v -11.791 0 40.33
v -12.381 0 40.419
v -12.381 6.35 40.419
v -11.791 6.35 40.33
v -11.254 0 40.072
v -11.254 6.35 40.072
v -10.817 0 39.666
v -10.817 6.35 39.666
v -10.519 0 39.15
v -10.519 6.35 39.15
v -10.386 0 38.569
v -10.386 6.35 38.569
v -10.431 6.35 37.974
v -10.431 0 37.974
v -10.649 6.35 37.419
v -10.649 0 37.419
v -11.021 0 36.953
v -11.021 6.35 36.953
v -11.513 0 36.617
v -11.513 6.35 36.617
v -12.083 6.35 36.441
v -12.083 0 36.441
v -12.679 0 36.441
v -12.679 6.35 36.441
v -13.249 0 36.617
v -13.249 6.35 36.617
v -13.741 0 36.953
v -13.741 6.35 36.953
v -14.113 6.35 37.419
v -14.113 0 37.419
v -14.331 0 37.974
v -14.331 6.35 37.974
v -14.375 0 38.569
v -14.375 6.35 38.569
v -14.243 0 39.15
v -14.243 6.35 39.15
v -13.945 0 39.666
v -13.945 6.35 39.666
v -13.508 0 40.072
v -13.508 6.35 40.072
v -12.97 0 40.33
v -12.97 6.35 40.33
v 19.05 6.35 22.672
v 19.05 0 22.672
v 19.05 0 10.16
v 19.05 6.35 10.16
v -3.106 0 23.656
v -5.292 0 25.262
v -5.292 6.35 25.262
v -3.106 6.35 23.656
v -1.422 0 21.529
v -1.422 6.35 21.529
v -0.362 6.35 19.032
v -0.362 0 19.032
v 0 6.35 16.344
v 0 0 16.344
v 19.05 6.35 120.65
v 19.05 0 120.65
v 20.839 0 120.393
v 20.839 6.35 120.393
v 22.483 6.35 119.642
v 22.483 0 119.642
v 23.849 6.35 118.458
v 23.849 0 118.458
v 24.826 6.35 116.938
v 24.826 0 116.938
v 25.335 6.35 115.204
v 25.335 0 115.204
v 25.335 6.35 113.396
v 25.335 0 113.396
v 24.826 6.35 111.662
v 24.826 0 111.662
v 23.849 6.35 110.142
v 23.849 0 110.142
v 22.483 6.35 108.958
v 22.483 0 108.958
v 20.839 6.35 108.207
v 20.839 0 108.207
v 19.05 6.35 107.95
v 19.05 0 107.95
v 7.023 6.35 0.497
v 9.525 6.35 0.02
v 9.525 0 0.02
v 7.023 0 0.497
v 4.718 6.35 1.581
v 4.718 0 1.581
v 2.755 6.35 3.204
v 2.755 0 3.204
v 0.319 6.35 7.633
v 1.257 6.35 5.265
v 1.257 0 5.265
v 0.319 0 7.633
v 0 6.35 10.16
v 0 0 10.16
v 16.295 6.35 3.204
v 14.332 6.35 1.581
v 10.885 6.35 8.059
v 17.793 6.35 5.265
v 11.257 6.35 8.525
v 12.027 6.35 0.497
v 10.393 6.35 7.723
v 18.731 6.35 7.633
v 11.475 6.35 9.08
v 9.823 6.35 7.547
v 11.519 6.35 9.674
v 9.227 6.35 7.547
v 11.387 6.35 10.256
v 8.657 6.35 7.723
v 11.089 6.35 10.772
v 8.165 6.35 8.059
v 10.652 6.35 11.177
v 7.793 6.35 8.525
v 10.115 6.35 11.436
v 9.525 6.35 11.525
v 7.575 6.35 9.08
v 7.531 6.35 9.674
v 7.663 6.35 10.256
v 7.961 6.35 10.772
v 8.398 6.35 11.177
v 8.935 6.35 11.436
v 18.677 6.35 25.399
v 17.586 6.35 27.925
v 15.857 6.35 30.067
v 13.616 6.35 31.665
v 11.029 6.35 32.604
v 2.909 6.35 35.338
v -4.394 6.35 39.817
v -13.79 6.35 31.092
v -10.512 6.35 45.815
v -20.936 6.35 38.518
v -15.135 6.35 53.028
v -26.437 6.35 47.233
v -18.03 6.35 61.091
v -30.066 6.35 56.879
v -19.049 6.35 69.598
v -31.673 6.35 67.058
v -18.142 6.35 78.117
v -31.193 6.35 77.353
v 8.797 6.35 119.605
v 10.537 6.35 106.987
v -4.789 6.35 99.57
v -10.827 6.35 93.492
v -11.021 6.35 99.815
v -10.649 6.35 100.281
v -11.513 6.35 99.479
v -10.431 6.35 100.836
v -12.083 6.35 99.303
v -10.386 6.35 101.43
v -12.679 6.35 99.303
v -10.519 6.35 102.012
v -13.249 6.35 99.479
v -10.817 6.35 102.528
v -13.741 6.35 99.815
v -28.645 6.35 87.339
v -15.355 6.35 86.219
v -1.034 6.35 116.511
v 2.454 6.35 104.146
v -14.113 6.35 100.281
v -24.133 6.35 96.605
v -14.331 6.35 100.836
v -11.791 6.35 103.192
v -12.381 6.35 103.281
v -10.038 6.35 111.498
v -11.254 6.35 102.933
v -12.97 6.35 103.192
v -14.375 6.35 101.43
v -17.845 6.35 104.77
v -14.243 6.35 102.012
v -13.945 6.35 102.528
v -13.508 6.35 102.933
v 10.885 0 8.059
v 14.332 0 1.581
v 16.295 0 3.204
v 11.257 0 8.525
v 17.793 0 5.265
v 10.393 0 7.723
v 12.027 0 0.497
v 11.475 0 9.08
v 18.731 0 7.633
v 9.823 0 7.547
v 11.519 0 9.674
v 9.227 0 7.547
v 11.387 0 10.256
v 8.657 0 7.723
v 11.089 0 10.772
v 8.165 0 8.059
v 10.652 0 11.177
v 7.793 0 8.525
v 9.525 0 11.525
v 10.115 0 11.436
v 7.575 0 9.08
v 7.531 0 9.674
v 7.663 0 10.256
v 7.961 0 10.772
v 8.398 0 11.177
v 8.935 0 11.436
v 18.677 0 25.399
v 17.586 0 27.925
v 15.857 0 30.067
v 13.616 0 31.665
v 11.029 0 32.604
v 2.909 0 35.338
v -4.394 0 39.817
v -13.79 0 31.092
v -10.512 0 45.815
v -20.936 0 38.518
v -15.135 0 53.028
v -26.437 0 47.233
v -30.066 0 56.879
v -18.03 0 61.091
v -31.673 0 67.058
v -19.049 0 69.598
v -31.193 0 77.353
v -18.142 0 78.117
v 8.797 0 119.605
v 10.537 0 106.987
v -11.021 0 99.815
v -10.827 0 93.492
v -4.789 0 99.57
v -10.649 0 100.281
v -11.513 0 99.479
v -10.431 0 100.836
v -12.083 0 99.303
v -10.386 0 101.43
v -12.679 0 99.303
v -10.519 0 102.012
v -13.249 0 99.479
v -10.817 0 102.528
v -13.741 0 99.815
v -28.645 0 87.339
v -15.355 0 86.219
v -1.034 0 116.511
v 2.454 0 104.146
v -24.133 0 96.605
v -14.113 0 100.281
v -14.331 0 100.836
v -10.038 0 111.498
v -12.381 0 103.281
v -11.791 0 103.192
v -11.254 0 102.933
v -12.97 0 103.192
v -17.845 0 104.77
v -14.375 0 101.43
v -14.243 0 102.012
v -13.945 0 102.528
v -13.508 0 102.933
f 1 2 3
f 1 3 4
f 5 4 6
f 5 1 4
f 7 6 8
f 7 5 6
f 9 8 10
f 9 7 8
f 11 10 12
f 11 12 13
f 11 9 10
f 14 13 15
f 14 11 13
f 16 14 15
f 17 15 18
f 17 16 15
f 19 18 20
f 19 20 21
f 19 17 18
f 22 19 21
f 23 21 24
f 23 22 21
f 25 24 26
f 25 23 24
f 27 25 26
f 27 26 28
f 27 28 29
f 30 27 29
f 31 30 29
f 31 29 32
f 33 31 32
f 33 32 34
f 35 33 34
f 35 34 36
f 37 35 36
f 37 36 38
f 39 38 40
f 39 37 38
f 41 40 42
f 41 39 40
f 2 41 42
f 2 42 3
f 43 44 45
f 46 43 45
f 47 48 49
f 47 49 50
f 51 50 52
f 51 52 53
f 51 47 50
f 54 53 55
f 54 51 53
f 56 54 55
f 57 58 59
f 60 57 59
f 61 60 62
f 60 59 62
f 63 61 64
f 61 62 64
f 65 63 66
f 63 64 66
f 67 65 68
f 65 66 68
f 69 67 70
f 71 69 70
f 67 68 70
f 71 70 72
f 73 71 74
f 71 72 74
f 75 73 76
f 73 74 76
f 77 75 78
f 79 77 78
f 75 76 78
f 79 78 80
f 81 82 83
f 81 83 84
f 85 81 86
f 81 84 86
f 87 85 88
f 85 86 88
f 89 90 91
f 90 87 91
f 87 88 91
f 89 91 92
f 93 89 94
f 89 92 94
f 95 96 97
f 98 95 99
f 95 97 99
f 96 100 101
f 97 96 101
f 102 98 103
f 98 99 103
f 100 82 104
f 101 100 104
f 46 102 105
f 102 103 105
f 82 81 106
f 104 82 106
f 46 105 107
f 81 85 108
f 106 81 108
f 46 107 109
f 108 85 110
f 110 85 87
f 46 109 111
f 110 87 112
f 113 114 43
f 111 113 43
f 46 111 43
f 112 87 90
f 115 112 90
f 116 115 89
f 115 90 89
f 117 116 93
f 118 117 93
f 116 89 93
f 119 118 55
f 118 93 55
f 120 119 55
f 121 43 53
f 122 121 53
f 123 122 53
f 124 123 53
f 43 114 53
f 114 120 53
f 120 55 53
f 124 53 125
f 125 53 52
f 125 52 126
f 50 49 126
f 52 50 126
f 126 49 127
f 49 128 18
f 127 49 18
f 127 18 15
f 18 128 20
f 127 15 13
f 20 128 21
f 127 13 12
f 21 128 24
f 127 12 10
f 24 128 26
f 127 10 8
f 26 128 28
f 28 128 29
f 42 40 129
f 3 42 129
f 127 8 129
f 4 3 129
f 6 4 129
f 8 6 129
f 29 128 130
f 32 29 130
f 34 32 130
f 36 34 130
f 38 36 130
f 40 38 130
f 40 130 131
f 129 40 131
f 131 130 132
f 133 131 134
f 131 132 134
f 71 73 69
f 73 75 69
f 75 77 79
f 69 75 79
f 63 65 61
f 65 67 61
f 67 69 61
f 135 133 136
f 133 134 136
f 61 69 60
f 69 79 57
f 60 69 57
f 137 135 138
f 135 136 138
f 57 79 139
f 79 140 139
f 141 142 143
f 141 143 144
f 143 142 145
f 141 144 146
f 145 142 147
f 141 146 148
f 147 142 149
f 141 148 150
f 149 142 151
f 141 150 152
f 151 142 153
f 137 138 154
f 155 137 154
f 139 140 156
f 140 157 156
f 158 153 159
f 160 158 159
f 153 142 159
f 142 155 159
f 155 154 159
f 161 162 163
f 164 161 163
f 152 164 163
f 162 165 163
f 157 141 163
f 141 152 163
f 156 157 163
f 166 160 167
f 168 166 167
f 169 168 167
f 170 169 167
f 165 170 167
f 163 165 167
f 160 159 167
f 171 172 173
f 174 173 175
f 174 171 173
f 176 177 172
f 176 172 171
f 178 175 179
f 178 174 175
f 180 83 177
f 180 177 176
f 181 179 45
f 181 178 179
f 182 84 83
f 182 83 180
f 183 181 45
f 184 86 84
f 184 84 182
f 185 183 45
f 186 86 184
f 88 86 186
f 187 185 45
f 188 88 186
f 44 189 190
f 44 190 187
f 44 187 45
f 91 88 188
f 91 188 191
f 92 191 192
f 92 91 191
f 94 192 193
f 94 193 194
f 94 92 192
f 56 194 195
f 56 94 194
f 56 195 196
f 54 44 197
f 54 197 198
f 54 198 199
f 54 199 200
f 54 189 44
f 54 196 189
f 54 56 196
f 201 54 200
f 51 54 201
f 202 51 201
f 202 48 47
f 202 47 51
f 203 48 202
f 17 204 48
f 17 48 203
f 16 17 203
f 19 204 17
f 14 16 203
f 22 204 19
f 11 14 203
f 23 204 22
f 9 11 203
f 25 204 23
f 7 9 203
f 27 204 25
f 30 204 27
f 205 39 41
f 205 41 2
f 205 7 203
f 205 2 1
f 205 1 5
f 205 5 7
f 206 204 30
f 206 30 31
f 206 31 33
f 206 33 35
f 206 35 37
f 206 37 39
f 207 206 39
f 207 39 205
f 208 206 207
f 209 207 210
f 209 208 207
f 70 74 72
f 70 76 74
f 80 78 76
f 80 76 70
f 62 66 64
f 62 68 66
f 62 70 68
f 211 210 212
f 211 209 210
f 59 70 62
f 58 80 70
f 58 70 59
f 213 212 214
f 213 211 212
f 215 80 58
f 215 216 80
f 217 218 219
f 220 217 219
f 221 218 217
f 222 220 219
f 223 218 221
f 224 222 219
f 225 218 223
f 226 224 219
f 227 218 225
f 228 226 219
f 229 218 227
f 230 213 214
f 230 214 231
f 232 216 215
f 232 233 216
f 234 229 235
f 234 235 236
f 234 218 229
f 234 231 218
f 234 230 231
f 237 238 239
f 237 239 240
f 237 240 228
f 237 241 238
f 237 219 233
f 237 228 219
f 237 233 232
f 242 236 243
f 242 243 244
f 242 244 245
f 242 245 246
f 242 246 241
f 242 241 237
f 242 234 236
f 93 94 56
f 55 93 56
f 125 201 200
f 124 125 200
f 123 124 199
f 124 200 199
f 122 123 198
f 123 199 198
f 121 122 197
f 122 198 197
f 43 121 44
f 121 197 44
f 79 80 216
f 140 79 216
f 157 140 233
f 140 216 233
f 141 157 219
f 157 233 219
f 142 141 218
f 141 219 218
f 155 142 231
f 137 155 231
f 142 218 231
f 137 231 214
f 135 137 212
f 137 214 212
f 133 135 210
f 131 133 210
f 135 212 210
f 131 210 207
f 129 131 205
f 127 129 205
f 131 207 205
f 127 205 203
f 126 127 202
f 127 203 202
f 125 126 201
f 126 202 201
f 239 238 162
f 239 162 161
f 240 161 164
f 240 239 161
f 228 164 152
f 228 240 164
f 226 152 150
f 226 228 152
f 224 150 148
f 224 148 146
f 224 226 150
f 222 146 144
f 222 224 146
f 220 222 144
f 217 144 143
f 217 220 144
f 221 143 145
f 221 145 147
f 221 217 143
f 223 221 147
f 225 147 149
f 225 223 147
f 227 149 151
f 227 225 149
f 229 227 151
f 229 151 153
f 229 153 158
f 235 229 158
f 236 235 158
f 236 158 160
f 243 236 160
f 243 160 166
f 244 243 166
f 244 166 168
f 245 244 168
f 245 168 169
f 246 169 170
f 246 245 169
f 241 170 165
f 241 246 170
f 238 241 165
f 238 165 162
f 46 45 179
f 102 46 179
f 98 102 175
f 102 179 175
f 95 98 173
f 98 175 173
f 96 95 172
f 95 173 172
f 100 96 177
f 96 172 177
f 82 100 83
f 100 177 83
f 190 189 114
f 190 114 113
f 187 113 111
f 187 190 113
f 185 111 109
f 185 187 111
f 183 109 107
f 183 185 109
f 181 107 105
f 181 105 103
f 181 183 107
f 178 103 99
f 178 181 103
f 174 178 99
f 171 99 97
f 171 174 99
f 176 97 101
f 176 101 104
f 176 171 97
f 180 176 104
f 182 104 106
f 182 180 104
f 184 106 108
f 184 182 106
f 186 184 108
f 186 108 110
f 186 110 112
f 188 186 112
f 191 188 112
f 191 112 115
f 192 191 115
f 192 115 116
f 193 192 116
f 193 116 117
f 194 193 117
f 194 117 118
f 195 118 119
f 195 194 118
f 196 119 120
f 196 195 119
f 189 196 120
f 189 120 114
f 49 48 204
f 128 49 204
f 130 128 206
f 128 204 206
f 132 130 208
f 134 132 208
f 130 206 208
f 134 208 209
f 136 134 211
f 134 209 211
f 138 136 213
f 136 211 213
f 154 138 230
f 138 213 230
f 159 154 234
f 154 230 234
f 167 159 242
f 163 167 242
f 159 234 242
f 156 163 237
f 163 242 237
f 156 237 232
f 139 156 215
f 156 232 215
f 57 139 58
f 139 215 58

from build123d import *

# Parameters (mm, degrees)
SKETCH1_R           = 2
BOSS_EXTRUDE1_DEPTH = 6.35
FILLET1_R           = 10.16


with BuildPart() as part:
    # Sketch1 → Boss-Extrude1 (new body)
    with BuildSketch(Plane(origin=(0, 0, 0), x_dir=(1, 0, 0), z_dir=(0, 1, 0))):
        with BuildLine():
            Line((19.05, 0), (0, 0))
            Line((0, 0), (0, -22.757139607))
            ThreePointArc((0, -22.757139607), (-30.814603217, -79.553676933), (19.05, -120.65))
            ThreePointArc((19.05, -120.65), (25.4, -114.3), (19.05, -107.95))
            ThreePointArc((19.05, -107.95), (-19.05, -69.85), (19.05, -31.75))
            Line((19.05, -31.75), (19.05, 0))
        make_face()
        with Locations(Location((9.525, -9.525, 0), (0, 0, 270))):
            Circle(SKETCH1_R, mode=Mode.SUBTRACT)
        with Locations(Location((-12.380896424, -38.419103576, 0), (0, 0, 270))):
            Circle(SKETCH1_R, mode=Mode.SUBTRACT)
        with Locations(Location((-12.380896424, -101.280896424, 0), (0, 0, 270))):
            Circle(SKETCH1_R, mode=Mode.SUBTRACT)
    extrude(amount=BOSS_EXTRUDE1_DEPTH)

    # Fillet1
    # the kernel refuses this fillet: 10.16 mm, written as the material it adds along each edge
    with BuildSketch(Plane(origin=(0, 0, 22.757139607), x_dir=(0, 0, -1), z_dir=(0, 1, 0))) as fillet1_piece_1:
        with BuildLine():
            CenterArc((6.413190667, 10.16), FILLET1_R, 208.630989837, 61.369010163)
            ThreePointArc((-2.50448451, 5.291666667), (-1.175949507, 2.681941807), (0, 0))
            Line((0, 0), (6.413190667, 0))
        make_face()
    extrude(amount=6.35)
    # the kernel refuses this fillet: 10.16 mm, written as the material it takes off along each edge
    with BuildSketch(Plane(origin=(19.05, -22.696015193, 31.75), x_dir=(0, 0, -1), z_dir=(0, 1, 0))) as fillet1_2_piece_1:
        with BuildLine():
            CenterArc((9.078406077, 10.16), FILLET1_R, 192.153197469, 77.846802531)
            ThreePointArc((-0.853889939, 8.021052632), (-0.214073897, 4.033187739), (0, 0))
            Line((0, 0), (9.078406077, 0))
        make_face()
    extrude(amount=51.742030387, mode=Mode.SUBTRACT)
    with BuildSketch(Plane(origin=(0, -25.4, 0), x_dir=(1, 0, 0), z_dir=(0, 1, 0)), Plane(origin=(19.05, -25.4, 0), x_dir=(0, 0, 1), z_dir=(0, 1, 0))) as fillet1_2_piece_2:
        with BuildLine():
            CenterArc((FILLET1_R, -FILLET1_R), FILLET1_R, 90, 90)
            Line((0, -FILLET1_R), (0, 0))
            Line((0, 0), (FILLET1_R, 0))
        make_face()
    extrude(amount=57.15, mode=Mode.SUBTRACT)


solid = part.part
